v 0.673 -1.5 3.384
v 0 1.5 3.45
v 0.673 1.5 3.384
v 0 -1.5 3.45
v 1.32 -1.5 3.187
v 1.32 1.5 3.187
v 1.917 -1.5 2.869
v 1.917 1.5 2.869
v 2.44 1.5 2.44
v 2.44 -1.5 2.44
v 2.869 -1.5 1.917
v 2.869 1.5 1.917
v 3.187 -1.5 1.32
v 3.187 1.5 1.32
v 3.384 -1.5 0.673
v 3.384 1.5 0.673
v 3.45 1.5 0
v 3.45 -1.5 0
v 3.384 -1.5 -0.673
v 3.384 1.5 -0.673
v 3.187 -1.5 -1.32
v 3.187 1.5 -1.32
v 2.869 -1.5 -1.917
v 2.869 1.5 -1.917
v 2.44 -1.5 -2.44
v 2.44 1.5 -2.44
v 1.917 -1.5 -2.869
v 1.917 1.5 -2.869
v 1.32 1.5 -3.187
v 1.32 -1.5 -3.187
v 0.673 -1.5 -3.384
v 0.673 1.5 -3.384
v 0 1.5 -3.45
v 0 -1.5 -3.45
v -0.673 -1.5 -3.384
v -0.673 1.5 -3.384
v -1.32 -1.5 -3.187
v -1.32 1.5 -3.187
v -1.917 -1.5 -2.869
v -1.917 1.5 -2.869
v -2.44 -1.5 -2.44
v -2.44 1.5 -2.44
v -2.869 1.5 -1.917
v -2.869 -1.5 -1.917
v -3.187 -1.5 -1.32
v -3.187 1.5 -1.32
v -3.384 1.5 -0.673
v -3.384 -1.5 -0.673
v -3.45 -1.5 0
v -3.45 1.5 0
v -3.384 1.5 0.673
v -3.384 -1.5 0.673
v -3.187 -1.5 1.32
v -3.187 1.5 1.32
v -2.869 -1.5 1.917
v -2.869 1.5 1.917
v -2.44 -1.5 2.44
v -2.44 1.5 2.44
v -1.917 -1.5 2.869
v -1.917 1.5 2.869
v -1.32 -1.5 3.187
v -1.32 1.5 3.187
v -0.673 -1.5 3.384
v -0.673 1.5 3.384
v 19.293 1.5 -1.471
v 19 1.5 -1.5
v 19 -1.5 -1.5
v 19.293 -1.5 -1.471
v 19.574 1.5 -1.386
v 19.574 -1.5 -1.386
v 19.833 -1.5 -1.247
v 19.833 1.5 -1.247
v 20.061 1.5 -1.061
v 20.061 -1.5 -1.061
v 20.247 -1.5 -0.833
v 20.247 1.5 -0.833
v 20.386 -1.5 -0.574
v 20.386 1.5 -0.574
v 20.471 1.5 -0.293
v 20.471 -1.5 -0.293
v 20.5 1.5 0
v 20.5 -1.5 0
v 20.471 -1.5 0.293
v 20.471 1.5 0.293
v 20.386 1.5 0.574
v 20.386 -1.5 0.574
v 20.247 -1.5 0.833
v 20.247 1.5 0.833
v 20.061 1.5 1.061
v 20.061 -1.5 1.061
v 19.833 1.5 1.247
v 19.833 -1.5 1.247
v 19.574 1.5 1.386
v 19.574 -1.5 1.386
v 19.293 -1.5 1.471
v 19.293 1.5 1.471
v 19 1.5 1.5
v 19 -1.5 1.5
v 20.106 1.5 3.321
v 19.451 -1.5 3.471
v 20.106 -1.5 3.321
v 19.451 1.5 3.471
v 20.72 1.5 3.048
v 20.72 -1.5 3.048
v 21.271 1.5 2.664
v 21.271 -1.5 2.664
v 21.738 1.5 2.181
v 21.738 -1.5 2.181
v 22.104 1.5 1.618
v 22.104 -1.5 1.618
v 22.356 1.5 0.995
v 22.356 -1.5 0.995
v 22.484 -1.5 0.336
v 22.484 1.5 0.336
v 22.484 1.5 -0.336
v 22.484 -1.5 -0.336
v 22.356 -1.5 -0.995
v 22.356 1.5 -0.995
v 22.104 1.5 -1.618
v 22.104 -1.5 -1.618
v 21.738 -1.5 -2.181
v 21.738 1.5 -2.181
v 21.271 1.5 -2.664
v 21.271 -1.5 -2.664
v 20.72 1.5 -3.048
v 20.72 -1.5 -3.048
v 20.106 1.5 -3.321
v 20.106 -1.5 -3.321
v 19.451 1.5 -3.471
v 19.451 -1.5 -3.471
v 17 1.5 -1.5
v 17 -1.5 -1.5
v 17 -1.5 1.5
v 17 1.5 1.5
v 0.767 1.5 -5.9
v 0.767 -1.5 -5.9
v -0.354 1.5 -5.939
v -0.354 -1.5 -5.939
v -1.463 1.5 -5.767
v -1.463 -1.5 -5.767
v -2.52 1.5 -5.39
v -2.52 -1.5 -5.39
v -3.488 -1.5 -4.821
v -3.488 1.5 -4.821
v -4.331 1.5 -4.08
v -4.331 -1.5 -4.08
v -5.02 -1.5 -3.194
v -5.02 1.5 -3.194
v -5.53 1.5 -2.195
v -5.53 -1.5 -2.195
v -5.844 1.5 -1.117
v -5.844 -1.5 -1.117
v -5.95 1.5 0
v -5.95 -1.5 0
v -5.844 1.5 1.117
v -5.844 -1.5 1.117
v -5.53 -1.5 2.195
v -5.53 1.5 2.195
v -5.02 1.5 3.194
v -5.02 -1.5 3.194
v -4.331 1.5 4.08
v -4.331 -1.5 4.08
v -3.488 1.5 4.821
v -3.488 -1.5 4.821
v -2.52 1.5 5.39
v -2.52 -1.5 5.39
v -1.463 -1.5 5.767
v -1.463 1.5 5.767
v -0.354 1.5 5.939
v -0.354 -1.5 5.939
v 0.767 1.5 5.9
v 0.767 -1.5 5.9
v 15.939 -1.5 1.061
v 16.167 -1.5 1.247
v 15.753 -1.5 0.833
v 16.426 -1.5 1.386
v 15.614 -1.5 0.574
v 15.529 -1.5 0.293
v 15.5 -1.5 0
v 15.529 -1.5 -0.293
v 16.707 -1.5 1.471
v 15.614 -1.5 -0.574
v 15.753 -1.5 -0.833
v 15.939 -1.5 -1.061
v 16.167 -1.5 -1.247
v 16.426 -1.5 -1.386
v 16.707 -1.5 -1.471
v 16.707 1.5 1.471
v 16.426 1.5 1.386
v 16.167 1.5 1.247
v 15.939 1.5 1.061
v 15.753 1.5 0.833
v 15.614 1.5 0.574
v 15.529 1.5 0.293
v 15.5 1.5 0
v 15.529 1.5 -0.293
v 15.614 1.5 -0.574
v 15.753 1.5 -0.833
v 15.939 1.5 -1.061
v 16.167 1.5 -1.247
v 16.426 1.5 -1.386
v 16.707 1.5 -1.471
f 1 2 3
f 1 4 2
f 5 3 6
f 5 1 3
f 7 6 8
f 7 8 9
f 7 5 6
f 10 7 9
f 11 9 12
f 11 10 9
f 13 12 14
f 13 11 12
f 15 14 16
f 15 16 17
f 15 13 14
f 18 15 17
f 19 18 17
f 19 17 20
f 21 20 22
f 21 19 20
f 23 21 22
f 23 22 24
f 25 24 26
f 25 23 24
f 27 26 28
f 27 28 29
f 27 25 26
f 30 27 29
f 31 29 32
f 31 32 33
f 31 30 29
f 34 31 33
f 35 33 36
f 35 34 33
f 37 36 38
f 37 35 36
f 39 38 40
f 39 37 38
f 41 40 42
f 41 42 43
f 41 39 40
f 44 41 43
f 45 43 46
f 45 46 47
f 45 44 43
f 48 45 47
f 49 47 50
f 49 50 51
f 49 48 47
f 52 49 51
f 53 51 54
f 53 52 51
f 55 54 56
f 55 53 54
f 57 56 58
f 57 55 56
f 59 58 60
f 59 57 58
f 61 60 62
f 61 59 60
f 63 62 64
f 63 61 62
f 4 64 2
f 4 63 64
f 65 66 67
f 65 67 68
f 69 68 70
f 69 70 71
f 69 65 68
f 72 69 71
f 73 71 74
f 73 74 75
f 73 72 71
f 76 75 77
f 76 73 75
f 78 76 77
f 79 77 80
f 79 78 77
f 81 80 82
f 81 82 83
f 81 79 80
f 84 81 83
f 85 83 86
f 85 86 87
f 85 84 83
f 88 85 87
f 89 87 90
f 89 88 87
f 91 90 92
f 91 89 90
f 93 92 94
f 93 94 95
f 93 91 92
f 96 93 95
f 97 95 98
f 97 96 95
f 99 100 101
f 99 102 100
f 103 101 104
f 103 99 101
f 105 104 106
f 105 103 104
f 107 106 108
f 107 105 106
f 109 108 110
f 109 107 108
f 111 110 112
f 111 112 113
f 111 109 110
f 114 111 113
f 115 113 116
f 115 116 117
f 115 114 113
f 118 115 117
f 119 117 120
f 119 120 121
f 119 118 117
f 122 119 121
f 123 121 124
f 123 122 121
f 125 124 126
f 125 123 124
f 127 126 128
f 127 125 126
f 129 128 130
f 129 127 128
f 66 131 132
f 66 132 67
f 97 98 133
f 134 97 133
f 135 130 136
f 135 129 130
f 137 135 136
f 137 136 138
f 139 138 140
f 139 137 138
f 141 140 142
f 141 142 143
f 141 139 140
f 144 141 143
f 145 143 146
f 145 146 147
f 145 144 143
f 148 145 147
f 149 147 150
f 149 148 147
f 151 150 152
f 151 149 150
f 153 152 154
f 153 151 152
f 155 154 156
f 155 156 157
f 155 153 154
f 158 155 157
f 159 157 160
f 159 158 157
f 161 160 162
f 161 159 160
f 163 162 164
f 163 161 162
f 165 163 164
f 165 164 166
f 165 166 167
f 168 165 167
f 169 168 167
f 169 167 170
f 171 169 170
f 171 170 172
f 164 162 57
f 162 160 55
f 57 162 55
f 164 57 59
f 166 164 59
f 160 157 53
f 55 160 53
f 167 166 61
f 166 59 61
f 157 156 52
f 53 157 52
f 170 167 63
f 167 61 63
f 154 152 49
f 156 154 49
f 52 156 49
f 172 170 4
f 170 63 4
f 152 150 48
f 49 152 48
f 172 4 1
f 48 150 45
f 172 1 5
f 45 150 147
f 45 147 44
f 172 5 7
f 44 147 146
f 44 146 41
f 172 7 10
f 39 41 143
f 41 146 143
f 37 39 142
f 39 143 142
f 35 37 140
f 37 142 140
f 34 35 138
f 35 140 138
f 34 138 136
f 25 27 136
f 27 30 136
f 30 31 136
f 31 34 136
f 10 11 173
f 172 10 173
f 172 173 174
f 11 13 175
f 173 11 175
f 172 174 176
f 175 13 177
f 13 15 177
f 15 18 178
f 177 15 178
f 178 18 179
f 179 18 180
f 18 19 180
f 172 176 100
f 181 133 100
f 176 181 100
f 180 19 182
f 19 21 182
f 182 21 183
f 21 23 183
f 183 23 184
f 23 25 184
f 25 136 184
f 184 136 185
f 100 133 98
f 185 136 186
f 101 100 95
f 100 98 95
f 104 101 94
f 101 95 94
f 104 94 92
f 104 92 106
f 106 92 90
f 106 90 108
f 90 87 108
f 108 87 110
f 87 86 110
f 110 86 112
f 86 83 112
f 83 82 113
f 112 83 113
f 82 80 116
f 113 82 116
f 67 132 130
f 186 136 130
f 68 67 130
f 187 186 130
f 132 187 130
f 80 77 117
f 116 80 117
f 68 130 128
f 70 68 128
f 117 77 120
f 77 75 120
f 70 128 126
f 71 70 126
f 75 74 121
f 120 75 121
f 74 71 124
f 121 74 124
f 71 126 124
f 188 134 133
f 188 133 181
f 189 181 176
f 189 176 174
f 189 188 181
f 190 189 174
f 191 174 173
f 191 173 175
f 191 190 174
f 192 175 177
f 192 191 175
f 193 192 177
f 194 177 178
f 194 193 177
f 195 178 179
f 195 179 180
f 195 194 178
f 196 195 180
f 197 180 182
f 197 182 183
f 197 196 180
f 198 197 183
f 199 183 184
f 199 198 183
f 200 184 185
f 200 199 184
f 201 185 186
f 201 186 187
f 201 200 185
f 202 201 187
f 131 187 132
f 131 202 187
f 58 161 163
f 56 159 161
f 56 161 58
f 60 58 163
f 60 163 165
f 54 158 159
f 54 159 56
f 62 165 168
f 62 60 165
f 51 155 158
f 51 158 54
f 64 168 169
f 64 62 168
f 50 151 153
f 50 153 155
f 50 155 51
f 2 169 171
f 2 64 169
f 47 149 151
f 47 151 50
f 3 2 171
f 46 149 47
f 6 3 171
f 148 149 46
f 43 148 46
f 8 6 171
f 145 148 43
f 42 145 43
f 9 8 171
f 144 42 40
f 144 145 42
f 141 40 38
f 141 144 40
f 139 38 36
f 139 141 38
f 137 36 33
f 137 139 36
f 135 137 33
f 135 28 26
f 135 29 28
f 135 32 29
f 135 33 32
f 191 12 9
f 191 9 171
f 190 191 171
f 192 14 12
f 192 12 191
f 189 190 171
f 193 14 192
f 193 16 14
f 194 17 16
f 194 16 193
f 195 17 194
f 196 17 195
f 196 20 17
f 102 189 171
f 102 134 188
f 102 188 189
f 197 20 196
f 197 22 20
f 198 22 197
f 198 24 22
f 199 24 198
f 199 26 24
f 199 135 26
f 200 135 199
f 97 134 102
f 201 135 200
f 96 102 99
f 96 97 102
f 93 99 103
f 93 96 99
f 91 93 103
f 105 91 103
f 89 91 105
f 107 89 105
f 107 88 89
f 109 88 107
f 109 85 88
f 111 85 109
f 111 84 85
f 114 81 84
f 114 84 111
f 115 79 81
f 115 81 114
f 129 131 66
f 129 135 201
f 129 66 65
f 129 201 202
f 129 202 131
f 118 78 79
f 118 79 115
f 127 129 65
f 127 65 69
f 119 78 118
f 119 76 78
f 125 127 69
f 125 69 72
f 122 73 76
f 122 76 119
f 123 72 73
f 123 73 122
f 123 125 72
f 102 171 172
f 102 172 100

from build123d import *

# Parameters (mm, degrees)
SKETCH1_R           = 3.45
BOSS_EXTRUDE1_DEPTH = 1.5


with BuildPart() as part:
    # Sketch1 → Boss-Extrude1 (new, symmetric)
    with BuildSketch(Plane(origin=(0, 0, 0), x_dir=(1, 0, 0), z_dir=(0, 1, 0))):
        with BuildLine():
            Line((19.451315789, 3.470780036), (0.767236842, 5.900326061))
            ThreePointArc((0.767236842, 5.900326061), (-5.95, 0), (0.767236842, -5.900326061))
            Line((0.767236842, -5.900326061), (19.451315789, -3.470780036))
            ThreePointArc((19.451315789, -3.470780036), (22.5, 0), (19.451315789, 3.470780036))
        make_face()
        with Locations(Location((0, 0, 0), (0, 0, 270))):
            Circle(SKETCH1_R, mode=Mode.SUBTRACT)
        with BuildLine():
            Line((19, -1.5), (17, -1.5))
            ThreePointArc((17, -1.5), (15.5, 0), (17, 1.5))
            Line((17, 1.5), (19, 1.5))
            ThreePointArc((19, 1.5), (20.5, 0), (19, -1.5))
        make_face(mode=Mode.SUBTRACT)
    extrude(amount=BOSS_EXTRUDE1_DEPTH, both=True)


solid = part.part
